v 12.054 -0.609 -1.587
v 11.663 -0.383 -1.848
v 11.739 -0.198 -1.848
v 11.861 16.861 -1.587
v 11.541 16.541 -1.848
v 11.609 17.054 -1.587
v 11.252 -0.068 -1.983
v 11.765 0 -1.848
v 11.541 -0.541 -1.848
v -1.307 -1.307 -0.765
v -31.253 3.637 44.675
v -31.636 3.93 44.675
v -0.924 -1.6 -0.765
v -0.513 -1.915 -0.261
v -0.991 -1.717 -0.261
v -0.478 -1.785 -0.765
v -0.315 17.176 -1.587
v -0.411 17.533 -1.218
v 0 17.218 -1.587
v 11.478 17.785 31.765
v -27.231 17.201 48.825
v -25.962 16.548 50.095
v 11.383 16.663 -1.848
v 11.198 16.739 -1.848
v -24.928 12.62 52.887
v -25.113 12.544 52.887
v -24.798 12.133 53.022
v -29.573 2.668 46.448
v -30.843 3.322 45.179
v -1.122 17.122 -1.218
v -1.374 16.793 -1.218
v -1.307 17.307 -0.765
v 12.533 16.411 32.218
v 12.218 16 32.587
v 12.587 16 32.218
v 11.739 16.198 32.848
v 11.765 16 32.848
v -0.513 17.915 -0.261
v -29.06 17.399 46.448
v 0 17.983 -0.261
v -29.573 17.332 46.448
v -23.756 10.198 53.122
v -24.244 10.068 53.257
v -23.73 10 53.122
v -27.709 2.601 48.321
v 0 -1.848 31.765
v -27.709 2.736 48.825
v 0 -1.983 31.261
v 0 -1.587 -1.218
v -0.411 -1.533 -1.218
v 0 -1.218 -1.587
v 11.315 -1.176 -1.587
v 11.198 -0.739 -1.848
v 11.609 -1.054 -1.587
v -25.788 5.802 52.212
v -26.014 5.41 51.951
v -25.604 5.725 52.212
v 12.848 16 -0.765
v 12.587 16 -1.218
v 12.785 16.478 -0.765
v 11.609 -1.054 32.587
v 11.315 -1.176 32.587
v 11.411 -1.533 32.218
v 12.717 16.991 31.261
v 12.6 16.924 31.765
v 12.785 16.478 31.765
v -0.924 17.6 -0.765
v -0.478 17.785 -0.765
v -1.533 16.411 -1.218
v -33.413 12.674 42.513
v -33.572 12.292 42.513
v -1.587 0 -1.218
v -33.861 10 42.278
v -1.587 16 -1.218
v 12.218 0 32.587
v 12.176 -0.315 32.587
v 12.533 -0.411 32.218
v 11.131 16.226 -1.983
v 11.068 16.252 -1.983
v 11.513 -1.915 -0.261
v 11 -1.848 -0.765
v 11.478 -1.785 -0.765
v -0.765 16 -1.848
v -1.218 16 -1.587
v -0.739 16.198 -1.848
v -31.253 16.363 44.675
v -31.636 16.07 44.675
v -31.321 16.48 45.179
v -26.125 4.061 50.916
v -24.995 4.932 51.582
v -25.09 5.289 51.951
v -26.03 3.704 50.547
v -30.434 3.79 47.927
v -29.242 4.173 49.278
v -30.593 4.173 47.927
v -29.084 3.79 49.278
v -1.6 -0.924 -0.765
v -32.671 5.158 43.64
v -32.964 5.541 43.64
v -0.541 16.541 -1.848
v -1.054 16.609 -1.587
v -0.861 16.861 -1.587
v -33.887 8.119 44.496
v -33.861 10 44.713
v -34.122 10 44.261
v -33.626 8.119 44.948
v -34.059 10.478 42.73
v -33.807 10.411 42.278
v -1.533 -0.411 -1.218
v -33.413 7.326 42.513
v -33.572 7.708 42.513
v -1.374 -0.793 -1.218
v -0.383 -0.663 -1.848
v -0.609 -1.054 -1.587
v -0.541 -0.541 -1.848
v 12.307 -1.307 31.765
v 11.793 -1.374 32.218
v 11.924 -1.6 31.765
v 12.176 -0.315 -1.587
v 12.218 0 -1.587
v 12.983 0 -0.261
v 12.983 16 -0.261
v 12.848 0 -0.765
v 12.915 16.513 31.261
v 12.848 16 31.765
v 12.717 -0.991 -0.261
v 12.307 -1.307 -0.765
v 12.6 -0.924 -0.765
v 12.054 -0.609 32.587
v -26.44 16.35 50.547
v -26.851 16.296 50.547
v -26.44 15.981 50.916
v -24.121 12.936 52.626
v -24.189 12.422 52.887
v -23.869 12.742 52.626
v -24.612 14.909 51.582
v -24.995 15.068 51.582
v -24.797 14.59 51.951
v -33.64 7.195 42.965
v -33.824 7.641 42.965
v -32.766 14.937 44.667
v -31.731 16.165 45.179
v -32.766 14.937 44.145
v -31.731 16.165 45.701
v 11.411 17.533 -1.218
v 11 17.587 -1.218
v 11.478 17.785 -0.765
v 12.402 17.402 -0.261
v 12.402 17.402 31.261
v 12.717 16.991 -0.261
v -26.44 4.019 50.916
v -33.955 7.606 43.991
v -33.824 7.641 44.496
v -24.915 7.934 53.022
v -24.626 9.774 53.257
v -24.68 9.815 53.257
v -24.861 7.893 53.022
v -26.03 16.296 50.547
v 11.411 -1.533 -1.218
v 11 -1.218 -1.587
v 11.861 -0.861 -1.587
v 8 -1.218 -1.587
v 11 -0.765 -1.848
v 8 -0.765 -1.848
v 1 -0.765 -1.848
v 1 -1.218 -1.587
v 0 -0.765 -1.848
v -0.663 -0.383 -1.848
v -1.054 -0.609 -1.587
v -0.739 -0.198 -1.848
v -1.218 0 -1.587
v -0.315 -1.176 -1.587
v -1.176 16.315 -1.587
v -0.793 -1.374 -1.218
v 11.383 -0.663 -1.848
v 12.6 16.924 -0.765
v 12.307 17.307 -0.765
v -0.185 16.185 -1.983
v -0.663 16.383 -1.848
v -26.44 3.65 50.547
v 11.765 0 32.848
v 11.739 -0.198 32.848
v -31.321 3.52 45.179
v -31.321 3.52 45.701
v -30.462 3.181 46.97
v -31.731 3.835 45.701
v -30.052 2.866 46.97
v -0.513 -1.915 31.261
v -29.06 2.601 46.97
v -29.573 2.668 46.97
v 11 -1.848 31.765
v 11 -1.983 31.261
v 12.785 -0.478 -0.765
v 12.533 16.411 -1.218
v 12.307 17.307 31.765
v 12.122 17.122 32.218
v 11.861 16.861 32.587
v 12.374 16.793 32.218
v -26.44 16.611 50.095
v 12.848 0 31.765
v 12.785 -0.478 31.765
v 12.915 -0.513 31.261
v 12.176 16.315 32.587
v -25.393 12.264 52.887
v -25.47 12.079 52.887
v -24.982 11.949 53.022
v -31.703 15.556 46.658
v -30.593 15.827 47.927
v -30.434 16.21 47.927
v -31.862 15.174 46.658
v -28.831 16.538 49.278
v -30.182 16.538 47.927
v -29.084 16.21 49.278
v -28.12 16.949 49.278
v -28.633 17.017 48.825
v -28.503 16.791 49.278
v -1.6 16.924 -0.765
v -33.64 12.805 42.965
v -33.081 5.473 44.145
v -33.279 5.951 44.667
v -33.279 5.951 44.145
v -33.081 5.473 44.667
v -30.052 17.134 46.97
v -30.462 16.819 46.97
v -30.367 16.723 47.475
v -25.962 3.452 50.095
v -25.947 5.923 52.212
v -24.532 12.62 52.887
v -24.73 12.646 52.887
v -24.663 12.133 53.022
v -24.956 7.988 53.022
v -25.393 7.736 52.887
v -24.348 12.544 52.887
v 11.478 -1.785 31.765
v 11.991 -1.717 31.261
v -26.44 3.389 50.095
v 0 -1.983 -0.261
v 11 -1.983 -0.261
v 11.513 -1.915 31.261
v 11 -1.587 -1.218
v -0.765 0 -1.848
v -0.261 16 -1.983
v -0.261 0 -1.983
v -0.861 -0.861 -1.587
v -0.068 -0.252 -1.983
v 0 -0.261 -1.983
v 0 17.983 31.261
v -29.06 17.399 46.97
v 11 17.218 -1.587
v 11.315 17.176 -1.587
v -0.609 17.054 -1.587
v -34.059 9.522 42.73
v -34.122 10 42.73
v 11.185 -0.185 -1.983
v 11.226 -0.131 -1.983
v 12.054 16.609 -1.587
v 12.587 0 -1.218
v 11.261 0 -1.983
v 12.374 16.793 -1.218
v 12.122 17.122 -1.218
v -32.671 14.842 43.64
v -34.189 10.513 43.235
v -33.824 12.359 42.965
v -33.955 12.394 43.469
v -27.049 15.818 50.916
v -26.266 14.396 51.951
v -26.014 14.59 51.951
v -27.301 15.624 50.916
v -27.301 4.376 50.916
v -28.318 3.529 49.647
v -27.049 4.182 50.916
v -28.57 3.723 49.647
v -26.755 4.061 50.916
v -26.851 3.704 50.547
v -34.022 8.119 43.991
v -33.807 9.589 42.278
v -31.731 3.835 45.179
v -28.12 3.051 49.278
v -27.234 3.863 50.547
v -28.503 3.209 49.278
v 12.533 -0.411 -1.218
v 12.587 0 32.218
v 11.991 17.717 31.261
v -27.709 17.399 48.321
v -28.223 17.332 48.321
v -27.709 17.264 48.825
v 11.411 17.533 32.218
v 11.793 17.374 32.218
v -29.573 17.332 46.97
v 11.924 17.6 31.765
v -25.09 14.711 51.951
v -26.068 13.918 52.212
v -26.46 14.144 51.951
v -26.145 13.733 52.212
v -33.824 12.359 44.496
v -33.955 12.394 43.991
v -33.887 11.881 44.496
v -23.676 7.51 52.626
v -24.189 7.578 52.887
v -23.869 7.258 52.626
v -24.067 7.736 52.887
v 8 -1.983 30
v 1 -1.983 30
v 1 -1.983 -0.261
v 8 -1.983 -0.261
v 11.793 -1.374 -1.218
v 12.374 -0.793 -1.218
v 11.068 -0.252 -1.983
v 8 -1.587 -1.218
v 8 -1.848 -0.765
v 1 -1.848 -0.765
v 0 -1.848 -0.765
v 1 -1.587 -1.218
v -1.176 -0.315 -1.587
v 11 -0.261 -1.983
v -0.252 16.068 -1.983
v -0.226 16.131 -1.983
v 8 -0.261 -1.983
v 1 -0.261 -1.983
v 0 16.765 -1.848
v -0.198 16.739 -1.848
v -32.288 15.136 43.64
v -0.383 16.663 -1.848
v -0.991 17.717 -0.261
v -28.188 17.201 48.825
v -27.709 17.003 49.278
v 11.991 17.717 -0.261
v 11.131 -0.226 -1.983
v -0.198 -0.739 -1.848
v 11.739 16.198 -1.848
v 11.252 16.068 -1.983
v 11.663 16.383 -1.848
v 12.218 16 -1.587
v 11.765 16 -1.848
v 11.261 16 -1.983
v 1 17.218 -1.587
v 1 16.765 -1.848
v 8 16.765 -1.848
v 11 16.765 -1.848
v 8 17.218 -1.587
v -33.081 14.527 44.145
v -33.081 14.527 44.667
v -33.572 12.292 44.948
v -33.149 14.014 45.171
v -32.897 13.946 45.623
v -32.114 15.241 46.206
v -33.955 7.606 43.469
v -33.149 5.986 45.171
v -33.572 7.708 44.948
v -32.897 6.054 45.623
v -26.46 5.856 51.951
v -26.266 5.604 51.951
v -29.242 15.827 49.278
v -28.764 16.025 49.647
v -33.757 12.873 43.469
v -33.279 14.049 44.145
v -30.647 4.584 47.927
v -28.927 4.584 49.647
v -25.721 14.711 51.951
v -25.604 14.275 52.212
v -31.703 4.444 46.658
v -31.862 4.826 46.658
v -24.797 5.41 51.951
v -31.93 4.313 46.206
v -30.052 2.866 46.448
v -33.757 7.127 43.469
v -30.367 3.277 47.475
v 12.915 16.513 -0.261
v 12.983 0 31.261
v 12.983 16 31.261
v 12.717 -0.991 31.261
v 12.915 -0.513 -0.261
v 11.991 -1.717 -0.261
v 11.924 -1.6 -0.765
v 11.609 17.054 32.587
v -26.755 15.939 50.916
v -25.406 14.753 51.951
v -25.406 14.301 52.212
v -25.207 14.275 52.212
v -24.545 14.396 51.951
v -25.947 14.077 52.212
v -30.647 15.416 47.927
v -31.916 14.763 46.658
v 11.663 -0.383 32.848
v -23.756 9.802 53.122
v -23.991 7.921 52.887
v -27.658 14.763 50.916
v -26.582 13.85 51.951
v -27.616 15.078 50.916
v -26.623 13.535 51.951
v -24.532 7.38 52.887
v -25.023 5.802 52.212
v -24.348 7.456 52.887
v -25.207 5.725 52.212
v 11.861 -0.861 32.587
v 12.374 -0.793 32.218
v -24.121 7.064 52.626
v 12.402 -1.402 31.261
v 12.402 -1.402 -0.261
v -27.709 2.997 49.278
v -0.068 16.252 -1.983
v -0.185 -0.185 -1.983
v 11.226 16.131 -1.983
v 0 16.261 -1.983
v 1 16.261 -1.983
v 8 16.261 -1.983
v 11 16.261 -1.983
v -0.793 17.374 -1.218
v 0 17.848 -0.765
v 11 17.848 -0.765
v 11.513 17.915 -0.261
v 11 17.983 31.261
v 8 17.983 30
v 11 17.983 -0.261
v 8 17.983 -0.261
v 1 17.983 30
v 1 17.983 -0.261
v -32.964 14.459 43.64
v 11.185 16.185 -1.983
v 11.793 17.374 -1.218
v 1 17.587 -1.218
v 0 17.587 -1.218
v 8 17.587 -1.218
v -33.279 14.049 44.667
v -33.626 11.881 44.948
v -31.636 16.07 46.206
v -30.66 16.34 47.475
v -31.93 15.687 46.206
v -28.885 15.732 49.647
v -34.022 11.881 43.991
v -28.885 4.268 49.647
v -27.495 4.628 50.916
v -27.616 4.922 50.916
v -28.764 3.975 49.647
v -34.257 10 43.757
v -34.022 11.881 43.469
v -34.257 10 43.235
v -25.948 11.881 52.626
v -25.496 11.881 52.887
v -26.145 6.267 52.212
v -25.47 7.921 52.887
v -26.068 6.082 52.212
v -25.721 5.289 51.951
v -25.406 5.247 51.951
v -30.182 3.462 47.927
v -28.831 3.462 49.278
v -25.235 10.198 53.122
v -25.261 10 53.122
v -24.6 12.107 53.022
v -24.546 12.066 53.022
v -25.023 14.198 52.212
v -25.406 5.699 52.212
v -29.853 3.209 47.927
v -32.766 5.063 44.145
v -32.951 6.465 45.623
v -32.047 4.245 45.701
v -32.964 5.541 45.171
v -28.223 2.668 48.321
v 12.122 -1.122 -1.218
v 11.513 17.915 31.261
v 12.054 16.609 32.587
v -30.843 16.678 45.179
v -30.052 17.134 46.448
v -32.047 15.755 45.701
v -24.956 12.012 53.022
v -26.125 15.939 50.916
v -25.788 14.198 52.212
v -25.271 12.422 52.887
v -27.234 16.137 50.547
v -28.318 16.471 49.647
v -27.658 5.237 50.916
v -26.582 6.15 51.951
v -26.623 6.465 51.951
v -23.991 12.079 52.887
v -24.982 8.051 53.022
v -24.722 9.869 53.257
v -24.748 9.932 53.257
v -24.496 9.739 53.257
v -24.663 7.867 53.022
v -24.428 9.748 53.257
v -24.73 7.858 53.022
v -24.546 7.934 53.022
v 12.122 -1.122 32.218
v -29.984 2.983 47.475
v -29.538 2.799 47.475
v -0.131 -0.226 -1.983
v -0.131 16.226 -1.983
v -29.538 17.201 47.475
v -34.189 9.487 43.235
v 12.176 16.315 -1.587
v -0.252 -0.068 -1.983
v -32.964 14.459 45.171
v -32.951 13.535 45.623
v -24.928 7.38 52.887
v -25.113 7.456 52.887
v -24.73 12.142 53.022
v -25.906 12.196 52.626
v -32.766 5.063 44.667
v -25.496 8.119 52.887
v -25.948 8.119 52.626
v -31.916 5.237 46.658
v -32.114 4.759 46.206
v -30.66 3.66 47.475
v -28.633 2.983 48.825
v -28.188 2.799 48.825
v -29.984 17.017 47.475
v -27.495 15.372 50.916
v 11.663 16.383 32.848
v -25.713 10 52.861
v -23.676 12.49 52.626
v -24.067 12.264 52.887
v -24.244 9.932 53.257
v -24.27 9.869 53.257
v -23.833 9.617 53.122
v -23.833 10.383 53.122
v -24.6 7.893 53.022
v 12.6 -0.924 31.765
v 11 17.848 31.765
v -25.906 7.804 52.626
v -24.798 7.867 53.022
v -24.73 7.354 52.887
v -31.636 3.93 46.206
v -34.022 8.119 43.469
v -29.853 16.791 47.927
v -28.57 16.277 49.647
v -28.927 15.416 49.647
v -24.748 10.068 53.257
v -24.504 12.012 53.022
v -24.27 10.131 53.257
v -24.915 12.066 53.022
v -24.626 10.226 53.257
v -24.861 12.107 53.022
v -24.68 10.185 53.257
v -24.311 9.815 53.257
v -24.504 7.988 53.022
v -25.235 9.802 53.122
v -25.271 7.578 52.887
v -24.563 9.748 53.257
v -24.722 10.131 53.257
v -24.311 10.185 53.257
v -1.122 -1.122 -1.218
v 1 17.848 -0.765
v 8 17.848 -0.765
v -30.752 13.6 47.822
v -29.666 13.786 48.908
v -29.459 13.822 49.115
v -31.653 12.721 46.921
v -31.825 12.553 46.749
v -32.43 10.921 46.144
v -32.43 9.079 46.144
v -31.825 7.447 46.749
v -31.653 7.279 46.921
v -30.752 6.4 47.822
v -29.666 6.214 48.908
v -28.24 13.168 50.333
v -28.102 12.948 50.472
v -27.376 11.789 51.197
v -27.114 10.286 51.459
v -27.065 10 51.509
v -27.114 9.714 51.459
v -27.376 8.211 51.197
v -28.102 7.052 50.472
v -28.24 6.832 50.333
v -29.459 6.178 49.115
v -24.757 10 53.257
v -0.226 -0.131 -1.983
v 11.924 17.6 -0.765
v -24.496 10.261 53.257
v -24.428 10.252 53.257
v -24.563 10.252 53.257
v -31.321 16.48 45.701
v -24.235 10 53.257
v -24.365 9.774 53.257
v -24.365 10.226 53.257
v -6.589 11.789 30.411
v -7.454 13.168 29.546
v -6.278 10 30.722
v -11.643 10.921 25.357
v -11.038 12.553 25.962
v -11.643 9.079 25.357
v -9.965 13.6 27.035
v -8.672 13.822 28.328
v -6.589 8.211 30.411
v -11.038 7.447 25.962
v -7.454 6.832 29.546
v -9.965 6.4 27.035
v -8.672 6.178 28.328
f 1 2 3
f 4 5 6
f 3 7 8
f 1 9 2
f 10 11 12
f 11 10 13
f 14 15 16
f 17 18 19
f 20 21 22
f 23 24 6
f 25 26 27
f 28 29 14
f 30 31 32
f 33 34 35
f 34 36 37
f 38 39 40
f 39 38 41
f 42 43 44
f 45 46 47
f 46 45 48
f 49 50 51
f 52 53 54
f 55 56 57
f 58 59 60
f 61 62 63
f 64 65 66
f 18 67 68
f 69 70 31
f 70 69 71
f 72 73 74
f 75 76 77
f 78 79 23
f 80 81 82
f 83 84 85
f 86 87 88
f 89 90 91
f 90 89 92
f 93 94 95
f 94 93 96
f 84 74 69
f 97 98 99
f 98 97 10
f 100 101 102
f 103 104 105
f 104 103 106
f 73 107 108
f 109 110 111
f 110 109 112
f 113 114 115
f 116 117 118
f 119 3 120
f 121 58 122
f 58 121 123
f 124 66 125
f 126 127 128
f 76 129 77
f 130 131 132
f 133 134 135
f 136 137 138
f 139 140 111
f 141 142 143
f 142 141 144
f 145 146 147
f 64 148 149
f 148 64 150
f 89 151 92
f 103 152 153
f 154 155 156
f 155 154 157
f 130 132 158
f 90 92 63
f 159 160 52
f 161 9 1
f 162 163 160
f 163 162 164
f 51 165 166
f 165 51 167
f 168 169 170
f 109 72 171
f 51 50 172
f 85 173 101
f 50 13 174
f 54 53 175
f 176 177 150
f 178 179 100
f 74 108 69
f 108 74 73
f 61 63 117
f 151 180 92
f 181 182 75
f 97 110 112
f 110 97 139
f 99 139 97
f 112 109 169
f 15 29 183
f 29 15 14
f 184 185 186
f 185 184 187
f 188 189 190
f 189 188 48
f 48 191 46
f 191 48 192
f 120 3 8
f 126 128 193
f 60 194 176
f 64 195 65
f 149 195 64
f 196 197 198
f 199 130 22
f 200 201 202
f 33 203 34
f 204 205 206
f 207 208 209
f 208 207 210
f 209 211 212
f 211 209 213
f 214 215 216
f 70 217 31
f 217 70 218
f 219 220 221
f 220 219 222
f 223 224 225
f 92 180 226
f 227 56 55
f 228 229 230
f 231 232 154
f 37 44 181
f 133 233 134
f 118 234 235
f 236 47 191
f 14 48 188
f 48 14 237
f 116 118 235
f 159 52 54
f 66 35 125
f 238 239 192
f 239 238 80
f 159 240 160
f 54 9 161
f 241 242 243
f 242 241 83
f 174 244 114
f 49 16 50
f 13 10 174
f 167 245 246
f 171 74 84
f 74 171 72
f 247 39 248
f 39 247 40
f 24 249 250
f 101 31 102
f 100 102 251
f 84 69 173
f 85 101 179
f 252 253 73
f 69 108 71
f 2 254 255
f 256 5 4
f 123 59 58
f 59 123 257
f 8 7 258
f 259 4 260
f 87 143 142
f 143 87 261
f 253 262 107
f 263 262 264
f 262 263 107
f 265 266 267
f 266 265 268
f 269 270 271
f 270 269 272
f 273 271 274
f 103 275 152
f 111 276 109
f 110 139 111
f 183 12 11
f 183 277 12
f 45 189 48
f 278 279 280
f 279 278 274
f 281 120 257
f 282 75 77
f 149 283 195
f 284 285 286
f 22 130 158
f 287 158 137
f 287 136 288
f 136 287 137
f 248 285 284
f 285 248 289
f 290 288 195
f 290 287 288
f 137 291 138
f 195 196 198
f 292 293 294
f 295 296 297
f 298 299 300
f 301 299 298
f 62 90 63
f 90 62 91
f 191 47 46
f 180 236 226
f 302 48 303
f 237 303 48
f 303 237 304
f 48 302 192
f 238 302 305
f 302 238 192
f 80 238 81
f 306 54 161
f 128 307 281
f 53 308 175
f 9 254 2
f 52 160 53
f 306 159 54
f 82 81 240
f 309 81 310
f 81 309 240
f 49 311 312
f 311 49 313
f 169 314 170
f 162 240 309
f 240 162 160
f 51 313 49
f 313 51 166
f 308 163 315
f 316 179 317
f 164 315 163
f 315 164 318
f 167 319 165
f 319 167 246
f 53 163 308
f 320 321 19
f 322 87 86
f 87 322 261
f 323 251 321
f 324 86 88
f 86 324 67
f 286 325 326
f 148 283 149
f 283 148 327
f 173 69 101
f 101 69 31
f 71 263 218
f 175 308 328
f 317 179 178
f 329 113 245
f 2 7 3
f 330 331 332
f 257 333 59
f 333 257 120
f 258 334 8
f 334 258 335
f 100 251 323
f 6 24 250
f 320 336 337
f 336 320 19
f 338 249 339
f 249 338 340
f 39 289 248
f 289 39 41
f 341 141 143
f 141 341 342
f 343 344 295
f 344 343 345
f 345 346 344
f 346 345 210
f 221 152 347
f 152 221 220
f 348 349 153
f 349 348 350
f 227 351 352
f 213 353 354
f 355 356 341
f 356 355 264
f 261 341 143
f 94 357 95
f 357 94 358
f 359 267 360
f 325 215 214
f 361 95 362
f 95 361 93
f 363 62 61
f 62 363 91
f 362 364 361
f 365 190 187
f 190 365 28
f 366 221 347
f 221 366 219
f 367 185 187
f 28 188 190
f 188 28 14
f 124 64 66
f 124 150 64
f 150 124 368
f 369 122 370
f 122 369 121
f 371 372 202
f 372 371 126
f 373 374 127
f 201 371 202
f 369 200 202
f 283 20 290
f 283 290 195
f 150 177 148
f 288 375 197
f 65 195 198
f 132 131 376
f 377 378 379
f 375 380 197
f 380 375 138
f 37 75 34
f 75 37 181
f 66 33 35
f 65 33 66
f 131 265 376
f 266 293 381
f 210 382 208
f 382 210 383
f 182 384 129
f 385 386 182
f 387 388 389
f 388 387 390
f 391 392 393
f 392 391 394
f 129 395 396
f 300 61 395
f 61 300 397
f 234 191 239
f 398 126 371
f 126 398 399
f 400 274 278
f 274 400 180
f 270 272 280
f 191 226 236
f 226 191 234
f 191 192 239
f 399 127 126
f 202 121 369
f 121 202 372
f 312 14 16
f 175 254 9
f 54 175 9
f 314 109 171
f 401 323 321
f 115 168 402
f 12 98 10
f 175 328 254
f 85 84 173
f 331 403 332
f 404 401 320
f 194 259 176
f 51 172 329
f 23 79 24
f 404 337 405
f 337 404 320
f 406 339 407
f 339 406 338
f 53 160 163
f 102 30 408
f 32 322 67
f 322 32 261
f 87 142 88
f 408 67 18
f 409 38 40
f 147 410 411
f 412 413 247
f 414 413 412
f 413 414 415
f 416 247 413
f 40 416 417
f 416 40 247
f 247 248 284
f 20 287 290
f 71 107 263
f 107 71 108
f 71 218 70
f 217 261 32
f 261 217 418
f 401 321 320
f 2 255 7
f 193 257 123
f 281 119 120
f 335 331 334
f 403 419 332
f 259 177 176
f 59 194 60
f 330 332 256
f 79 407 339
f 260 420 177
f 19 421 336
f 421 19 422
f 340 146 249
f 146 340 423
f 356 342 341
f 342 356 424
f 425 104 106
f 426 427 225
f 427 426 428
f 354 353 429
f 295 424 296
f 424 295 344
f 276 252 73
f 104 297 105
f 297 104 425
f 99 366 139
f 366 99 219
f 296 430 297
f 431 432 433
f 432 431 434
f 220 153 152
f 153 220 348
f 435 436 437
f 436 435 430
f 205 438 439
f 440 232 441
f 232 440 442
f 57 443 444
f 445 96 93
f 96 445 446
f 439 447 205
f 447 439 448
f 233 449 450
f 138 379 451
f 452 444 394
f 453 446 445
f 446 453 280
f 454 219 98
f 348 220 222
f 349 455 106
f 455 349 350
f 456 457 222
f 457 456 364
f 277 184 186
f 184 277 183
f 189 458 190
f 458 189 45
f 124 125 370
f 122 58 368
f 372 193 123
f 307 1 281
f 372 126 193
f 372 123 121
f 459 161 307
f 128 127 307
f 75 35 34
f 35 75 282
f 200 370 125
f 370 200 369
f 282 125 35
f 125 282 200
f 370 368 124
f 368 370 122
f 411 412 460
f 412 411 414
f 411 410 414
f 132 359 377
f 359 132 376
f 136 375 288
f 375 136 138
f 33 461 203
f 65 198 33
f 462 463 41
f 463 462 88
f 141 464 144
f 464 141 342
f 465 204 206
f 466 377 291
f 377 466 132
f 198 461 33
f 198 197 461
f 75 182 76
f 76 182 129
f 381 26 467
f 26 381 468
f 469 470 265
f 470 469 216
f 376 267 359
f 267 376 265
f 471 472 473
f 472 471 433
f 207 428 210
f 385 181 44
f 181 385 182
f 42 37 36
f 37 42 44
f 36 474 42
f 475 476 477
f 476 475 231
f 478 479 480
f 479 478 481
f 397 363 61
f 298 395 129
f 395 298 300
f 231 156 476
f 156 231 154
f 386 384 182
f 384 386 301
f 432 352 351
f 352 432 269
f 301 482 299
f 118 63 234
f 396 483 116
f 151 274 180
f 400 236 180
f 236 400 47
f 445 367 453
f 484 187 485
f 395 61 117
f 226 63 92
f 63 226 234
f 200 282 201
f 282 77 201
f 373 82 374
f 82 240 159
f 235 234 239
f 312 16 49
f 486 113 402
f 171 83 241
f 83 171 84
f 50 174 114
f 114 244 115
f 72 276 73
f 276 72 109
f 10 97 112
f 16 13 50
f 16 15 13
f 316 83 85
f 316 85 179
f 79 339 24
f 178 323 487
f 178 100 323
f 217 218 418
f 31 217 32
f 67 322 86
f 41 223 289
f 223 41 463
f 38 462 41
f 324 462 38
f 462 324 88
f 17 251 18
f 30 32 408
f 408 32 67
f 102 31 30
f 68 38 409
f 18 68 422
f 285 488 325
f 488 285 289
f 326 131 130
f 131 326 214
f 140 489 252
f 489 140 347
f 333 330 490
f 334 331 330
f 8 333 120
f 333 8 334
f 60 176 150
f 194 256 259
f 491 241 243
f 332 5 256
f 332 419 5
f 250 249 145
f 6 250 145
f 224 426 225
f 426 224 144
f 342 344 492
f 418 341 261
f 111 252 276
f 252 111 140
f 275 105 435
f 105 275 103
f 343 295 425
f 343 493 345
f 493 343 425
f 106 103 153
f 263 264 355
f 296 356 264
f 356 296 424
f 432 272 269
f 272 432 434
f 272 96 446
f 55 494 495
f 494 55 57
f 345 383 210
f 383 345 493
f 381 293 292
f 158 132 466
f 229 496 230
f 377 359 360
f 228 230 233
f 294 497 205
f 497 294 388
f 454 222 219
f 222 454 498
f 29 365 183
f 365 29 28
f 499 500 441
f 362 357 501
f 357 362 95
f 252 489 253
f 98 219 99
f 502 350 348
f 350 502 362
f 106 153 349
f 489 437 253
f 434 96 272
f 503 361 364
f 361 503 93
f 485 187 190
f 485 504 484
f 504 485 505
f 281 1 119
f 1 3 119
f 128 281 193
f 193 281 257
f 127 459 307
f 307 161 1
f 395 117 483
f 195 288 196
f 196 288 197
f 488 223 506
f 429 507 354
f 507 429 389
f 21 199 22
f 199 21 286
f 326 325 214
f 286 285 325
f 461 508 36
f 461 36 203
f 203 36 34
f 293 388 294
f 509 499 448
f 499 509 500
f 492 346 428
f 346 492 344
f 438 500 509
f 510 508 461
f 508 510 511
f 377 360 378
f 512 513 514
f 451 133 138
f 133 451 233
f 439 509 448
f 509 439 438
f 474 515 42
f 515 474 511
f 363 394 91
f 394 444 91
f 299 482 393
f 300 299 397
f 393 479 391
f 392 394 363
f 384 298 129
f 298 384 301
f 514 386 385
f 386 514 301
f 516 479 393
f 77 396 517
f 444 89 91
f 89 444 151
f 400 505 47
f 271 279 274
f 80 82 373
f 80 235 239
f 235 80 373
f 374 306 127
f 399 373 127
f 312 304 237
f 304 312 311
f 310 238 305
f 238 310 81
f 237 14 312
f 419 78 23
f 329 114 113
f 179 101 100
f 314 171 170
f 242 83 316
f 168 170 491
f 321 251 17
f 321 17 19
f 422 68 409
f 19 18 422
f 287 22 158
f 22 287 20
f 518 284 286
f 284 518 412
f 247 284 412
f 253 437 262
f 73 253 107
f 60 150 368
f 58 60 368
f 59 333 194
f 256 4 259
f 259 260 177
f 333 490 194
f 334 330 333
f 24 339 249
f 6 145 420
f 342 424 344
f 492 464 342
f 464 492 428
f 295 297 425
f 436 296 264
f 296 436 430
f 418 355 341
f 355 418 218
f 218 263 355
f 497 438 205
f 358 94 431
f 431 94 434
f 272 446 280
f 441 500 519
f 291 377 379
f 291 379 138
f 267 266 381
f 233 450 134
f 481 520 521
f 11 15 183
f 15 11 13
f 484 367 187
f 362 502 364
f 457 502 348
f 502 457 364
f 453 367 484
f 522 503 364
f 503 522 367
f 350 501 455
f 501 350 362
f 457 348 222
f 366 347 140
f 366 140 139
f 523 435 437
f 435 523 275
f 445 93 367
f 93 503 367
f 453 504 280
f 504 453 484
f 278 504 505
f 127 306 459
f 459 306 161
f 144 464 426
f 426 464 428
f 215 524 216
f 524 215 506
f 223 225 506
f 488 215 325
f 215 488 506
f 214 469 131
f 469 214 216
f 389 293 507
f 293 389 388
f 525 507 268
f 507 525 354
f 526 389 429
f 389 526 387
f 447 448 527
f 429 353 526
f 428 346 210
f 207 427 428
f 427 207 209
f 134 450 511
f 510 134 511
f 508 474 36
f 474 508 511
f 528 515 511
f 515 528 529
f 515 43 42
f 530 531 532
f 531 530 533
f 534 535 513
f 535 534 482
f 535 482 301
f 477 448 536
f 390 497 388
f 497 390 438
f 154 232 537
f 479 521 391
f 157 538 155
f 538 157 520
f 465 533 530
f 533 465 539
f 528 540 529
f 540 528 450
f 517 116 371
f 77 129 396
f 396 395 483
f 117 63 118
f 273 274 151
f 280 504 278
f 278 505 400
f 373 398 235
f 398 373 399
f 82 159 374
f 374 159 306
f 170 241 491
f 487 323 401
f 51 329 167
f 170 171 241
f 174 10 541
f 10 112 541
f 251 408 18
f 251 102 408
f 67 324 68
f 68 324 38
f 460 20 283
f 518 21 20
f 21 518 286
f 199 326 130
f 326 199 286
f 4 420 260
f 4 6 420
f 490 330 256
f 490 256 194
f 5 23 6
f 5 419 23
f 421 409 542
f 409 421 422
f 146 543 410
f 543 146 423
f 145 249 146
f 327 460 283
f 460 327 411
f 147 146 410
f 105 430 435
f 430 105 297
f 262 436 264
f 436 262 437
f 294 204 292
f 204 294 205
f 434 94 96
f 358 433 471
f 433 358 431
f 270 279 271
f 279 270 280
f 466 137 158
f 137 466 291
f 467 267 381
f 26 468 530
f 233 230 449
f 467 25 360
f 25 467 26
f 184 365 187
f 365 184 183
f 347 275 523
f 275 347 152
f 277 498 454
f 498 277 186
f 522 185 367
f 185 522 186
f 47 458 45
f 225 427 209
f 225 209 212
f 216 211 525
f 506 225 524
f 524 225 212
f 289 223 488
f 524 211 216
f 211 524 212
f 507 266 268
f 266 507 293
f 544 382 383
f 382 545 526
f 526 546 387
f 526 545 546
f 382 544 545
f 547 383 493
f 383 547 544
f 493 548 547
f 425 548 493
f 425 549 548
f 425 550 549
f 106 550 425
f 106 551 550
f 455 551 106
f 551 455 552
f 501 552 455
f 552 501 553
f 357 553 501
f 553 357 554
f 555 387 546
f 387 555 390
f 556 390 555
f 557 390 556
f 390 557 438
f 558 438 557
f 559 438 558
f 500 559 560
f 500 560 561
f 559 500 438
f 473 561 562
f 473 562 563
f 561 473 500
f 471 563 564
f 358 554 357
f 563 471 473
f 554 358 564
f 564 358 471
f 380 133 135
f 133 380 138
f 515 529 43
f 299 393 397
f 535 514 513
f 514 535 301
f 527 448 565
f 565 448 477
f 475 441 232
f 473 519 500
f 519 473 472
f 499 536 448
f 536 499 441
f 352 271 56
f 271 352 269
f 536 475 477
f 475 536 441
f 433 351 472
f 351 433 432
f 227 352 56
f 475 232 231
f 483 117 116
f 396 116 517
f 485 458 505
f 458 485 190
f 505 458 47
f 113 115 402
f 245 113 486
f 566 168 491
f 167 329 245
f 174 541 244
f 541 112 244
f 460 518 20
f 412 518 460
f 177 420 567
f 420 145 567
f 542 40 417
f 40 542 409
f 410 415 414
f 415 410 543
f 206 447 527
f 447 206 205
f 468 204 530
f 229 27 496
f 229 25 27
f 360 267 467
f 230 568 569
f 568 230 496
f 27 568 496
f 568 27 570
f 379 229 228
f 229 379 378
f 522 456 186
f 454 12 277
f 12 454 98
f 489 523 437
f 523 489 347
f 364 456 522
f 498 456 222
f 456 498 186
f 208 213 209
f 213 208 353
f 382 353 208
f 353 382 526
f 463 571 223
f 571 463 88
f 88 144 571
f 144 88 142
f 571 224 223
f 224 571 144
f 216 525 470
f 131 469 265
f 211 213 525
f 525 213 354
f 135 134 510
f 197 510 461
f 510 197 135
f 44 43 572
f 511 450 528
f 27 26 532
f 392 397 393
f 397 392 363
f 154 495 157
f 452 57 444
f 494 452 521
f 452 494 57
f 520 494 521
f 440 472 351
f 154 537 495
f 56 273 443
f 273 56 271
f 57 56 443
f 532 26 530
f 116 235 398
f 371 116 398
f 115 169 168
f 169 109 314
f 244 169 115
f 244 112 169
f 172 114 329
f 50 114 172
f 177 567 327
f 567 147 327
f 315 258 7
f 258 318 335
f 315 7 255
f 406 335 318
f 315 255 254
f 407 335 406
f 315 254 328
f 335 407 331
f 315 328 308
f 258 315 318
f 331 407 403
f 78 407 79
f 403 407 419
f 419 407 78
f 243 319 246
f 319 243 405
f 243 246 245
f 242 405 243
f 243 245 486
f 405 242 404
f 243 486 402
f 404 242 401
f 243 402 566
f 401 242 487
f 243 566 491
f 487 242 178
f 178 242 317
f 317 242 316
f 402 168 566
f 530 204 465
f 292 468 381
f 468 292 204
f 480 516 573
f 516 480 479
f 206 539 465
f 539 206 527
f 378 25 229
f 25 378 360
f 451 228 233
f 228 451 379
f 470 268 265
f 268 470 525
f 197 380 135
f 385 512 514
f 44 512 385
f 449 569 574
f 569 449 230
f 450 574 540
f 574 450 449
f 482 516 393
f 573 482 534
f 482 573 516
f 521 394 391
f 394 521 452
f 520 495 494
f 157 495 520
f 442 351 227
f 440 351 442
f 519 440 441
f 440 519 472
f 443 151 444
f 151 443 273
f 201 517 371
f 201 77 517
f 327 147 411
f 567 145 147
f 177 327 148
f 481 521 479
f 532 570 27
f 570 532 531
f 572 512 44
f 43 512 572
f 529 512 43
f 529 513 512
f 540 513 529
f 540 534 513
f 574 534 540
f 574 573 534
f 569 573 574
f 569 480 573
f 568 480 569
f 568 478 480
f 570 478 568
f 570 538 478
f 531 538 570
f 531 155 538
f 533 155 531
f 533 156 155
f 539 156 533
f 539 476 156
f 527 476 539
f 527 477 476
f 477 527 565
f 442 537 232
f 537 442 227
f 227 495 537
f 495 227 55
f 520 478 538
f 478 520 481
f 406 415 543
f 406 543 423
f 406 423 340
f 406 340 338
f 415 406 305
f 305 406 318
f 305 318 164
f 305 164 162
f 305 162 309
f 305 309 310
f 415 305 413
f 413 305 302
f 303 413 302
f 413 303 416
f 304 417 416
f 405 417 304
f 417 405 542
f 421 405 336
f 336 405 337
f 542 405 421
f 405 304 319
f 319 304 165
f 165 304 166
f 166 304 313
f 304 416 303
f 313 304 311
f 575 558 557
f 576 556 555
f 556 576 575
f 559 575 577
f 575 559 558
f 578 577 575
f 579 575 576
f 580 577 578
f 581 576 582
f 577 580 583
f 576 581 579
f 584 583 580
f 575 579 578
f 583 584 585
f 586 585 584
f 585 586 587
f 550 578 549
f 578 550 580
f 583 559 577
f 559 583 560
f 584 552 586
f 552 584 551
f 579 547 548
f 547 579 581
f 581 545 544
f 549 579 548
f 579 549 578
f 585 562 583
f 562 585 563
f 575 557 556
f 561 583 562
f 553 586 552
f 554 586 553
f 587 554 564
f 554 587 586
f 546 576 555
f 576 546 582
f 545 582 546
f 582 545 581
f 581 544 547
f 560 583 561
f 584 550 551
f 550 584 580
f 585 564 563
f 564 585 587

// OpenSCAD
difference(){
    minkowski(){
        hull(){
            translate([-10,15/2+5/2,29])rotate([0,-45,0])cylinder(r=15/2-2,h=30-4);
            cube([15-4,20-4,35-4]);
        }
        sphere(r=2,$fn=24);
    }


    translate([6-5,-5,-10])cube([7,30,40]);
    translate([-9,10,28])rotate([0,-45,0])cylinder(r=7.7/2,h=35);
    //translate([-45,-32-7,-25])cube(50);
}
